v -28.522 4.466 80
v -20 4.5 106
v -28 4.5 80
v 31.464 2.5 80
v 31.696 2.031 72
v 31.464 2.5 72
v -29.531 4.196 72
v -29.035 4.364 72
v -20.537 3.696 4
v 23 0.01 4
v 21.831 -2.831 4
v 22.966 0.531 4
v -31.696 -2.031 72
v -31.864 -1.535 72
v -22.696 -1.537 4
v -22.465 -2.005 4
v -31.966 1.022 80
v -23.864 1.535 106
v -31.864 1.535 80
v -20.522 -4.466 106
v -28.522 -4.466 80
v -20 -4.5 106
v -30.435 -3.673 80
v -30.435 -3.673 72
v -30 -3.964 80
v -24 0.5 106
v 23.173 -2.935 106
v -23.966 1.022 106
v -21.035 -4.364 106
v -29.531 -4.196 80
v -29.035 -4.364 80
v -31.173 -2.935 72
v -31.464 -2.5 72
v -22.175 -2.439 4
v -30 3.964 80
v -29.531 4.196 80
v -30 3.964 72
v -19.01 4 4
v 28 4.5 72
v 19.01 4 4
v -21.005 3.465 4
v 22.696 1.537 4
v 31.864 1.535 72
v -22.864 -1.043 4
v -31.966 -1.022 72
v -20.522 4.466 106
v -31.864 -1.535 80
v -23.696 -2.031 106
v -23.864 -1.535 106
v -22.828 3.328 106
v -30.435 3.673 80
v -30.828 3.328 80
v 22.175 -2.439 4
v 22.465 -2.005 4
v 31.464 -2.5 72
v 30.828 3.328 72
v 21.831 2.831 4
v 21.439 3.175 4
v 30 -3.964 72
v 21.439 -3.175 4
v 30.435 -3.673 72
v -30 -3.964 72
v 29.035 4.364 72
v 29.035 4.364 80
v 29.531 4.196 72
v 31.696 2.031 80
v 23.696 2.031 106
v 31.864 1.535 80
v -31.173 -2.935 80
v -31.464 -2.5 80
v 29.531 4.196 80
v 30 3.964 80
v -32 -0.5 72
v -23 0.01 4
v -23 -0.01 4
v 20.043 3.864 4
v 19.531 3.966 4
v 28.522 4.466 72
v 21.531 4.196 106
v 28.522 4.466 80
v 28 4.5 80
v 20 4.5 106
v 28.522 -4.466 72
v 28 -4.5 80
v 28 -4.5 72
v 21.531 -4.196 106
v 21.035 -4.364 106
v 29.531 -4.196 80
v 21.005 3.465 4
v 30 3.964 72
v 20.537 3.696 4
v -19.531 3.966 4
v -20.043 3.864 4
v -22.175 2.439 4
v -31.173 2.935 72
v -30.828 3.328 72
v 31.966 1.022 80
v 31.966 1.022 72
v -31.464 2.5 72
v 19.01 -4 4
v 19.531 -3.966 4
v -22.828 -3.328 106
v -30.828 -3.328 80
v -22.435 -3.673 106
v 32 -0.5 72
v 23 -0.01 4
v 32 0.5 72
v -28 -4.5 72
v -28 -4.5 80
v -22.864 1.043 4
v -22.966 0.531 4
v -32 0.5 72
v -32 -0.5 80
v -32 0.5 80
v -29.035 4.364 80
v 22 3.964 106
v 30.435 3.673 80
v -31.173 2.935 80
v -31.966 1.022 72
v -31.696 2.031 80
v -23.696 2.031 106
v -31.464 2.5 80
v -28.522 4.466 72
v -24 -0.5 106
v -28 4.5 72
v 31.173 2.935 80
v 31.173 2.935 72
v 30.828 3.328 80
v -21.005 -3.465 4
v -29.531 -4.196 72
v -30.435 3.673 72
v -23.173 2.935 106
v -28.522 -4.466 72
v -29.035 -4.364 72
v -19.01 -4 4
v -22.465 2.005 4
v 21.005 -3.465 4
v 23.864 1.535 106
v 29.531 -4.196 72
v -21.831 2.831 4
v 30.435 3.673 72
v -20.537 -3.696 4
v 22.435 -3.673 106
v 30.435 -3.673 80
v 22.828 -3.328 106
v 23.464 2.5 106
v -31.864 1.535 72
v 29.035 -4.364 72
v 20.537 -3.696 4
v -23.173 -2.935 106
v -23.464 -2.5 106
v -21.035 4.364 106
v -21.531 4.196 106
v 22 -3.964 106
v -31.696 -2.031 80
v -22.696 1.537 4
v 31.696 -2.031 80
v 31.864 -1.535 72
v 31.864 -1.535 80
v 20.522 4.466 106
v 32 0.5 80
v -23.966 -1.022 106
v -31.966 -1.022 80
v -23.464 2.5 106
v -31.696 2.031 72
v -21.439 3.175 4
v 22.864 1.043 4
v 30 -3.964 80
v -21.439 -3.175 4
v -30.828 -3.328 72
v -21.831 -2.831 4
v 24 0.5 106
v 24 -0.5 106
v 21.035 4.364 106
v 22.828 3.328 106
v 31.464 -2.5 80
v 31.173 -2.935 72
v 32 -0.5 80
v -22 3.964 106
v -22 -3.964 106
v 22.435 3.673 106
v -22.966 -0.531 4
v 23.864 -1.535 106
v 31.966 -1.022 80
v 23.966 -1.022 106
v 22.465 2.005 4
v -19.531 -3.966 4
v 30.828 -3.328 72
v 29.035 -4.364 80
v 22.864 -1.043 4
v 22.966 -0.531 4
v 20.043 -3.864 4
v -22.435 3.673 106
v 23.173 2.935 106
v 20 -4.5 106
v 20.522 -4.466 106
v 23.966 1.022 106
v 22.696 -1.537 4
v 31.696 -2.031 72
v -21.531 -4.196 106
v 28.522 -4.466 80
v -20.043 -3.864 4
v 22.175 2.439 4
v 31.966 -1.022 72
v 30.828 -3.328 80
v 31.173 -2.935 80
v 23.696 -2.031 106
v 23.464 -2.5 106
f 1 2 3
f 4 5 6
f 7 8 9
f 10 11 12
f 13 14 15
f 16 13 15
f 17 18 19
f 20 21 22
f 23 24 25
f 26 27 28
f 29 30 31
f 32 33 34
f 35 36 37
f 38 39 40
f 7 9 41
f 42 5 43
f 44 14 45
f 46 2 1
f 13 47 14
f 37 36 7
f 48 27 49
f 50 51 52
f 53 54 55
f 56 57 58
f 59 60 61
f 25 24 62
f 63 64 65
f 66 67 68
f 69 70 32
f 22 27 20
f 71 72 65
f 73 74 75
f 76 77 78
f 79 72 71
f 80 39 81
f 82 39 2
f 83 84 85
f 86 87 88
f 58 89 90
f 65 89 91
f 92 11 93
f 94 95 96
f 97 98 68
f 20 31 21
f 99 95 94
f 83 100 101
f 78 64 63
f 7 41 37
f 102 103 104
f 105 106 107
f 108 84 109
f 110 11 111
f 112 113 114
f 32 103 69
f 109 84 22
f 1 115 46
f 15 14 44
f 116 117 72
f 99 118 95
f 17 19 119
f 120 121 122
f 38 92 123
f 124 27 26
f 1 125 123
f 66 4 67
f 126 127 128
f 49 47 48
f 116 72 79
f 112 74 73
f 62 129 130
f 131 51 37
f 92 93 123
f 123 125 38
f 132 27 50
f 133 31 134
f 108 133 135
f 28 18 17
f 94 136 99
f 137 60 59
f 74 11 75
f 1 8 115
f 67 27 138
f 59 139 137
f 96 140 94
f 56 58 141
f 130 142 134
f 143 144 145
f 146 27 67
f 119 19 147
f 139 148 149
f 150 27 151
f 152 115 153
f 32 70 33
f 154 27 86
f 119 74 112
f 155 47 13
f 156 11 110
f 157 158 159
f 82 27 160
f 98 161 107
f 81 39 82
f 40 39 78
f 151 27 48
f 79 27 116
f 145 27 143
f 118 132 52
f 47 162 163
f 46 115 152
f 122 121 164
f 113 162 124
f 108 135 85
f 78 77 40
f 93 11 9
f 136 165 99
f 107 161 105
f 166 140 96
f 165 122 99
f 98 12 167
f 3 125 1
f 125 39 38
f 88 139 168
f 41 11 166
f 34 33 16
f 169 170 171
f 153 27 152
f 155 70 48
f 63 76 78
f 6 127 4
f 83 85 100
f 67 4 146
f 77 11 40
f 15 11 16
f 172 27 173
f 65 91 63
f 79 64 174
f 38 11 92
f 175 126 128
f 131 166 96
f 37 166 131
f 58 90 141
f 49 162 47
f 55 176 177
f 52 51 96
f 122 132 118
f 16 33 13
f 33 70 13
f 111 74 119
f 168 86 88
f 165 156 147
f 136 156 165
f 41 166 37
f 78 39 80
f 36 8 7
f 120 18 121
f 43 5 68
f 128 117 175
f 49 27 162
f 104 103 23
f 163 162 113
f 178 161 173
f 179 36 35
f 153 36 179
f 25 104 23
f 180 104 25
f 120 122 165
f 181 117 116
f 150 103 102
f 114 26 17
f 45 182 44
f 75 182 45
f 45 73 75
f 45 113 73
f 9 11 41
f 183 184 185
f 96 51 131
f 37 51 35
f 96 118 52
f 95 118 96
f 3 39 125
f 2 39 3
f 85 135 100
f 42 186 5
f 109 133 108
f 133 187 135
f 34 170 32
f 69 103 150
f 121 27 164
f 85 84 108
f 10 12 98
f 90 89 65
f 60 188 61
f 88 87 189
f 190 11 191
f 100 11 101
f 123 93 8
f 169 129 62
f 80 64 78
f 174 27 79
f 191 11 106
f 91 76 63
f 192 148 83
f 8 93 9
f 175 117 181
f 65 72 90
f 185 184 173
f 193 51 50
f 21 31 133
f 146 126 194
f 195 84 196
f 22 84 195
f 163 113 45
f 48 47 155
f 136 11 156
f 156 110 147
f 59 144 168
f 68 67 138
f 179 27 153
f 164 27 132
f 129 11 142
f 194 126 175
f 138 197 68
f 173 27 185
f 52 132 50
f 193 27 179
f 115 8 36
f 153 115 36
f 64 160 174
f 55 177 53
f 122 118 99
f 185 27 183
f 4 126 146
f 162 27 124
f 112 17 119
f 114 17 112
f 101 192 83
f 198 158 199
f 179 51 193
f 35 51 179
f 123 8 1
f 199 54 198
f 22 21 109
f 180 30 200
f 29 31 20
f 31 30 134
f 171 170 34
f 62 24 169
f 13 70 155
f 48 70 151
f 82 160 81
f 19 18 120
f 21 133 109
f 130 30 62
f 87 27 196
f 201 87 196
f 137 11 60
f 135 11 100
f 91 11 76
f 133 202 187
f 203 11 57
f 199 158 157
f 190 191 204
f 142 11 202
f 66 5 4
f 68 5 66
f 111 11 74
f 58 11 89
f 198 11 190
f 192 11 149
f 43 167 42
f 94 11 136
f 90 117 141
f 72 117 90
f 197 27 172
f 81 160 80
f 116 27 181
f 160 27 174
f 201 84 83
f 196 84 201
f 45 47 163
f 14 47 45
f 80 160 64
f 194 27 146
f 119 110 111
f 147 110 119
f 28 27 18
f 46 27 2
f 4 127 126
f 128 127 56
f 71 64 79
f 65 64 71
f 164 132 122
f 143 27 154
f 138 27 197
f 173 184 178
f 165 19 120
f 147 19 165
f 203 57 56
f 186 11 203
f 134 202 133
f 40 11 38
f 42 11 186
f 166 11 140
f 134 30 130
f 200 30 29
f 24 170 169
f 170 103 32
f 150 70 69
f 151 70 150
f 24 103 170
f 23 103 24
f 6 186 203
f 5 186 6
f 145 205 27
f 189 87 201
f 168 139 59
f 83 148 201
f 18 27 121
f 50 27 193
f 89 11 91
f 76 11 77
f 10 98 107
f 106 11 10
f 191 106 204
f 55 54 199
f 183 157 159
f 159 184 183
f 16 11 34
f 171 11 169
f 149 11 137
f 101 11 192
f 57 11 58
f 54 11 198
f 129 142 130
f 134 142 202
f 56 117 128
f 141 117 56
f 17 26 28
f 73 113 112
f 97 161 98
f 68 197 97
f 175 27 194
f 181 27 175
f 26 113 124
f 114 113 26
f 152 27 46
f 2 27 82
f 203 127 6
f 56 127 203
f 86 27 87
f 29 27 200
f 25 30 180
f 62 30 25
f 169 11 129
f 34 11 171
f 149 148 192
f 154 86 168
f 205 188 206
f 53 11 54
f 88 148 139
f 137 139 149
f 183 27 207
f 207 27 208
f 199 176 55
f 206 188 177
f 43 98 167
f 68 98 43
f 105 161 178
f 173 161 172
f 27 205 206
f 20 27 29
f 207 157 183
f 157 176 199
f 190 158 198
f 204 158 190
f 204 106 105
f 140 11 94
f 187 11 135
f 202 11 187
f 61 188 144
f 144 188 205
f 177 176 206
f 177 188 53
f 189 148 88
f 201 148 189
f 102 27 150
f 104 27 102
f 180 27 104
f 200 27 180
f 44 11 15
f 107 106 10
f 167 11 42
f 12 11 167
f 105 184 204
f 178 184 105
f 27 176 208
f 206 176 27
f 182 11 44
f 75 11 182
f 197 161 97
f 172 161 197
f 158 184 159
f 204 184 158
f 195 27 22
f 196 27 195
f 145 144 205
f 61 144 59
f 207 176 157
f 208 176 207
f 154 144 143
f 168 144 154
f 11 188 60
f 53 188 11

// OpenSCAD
// Pattern: bucket seat shell from layered hull profiles.
// Use this for styled seats where exact organic surfaces are not available.

$fn = 48;

module rounded_rect_2d(w, h, r) {
    rr = min(r, min(w, h) / 2 - 0.01);
    hull() {
        for (x = [-w / 2 + rr, w / 2 - rr])
            for (y = [-h / 2 + rr, h / 2 - rr])
                translate([x, y])
                    circle(r = rr);
    }
}

module layer(width, thick, z, h = 8, r = 4) {
    translate([0, 0, z])
        linear_extrude(height = h, center = true)
            rounded_rect_2d(width, thick, r);
}

module bucket_back_shell() {
    hull() {
        layer(46, 8, 8);
        layer(36, 8, 40);
        layer(64, 9, 76);
        layer(48, 9, 102);
    }
}

bucket_back_shell();
